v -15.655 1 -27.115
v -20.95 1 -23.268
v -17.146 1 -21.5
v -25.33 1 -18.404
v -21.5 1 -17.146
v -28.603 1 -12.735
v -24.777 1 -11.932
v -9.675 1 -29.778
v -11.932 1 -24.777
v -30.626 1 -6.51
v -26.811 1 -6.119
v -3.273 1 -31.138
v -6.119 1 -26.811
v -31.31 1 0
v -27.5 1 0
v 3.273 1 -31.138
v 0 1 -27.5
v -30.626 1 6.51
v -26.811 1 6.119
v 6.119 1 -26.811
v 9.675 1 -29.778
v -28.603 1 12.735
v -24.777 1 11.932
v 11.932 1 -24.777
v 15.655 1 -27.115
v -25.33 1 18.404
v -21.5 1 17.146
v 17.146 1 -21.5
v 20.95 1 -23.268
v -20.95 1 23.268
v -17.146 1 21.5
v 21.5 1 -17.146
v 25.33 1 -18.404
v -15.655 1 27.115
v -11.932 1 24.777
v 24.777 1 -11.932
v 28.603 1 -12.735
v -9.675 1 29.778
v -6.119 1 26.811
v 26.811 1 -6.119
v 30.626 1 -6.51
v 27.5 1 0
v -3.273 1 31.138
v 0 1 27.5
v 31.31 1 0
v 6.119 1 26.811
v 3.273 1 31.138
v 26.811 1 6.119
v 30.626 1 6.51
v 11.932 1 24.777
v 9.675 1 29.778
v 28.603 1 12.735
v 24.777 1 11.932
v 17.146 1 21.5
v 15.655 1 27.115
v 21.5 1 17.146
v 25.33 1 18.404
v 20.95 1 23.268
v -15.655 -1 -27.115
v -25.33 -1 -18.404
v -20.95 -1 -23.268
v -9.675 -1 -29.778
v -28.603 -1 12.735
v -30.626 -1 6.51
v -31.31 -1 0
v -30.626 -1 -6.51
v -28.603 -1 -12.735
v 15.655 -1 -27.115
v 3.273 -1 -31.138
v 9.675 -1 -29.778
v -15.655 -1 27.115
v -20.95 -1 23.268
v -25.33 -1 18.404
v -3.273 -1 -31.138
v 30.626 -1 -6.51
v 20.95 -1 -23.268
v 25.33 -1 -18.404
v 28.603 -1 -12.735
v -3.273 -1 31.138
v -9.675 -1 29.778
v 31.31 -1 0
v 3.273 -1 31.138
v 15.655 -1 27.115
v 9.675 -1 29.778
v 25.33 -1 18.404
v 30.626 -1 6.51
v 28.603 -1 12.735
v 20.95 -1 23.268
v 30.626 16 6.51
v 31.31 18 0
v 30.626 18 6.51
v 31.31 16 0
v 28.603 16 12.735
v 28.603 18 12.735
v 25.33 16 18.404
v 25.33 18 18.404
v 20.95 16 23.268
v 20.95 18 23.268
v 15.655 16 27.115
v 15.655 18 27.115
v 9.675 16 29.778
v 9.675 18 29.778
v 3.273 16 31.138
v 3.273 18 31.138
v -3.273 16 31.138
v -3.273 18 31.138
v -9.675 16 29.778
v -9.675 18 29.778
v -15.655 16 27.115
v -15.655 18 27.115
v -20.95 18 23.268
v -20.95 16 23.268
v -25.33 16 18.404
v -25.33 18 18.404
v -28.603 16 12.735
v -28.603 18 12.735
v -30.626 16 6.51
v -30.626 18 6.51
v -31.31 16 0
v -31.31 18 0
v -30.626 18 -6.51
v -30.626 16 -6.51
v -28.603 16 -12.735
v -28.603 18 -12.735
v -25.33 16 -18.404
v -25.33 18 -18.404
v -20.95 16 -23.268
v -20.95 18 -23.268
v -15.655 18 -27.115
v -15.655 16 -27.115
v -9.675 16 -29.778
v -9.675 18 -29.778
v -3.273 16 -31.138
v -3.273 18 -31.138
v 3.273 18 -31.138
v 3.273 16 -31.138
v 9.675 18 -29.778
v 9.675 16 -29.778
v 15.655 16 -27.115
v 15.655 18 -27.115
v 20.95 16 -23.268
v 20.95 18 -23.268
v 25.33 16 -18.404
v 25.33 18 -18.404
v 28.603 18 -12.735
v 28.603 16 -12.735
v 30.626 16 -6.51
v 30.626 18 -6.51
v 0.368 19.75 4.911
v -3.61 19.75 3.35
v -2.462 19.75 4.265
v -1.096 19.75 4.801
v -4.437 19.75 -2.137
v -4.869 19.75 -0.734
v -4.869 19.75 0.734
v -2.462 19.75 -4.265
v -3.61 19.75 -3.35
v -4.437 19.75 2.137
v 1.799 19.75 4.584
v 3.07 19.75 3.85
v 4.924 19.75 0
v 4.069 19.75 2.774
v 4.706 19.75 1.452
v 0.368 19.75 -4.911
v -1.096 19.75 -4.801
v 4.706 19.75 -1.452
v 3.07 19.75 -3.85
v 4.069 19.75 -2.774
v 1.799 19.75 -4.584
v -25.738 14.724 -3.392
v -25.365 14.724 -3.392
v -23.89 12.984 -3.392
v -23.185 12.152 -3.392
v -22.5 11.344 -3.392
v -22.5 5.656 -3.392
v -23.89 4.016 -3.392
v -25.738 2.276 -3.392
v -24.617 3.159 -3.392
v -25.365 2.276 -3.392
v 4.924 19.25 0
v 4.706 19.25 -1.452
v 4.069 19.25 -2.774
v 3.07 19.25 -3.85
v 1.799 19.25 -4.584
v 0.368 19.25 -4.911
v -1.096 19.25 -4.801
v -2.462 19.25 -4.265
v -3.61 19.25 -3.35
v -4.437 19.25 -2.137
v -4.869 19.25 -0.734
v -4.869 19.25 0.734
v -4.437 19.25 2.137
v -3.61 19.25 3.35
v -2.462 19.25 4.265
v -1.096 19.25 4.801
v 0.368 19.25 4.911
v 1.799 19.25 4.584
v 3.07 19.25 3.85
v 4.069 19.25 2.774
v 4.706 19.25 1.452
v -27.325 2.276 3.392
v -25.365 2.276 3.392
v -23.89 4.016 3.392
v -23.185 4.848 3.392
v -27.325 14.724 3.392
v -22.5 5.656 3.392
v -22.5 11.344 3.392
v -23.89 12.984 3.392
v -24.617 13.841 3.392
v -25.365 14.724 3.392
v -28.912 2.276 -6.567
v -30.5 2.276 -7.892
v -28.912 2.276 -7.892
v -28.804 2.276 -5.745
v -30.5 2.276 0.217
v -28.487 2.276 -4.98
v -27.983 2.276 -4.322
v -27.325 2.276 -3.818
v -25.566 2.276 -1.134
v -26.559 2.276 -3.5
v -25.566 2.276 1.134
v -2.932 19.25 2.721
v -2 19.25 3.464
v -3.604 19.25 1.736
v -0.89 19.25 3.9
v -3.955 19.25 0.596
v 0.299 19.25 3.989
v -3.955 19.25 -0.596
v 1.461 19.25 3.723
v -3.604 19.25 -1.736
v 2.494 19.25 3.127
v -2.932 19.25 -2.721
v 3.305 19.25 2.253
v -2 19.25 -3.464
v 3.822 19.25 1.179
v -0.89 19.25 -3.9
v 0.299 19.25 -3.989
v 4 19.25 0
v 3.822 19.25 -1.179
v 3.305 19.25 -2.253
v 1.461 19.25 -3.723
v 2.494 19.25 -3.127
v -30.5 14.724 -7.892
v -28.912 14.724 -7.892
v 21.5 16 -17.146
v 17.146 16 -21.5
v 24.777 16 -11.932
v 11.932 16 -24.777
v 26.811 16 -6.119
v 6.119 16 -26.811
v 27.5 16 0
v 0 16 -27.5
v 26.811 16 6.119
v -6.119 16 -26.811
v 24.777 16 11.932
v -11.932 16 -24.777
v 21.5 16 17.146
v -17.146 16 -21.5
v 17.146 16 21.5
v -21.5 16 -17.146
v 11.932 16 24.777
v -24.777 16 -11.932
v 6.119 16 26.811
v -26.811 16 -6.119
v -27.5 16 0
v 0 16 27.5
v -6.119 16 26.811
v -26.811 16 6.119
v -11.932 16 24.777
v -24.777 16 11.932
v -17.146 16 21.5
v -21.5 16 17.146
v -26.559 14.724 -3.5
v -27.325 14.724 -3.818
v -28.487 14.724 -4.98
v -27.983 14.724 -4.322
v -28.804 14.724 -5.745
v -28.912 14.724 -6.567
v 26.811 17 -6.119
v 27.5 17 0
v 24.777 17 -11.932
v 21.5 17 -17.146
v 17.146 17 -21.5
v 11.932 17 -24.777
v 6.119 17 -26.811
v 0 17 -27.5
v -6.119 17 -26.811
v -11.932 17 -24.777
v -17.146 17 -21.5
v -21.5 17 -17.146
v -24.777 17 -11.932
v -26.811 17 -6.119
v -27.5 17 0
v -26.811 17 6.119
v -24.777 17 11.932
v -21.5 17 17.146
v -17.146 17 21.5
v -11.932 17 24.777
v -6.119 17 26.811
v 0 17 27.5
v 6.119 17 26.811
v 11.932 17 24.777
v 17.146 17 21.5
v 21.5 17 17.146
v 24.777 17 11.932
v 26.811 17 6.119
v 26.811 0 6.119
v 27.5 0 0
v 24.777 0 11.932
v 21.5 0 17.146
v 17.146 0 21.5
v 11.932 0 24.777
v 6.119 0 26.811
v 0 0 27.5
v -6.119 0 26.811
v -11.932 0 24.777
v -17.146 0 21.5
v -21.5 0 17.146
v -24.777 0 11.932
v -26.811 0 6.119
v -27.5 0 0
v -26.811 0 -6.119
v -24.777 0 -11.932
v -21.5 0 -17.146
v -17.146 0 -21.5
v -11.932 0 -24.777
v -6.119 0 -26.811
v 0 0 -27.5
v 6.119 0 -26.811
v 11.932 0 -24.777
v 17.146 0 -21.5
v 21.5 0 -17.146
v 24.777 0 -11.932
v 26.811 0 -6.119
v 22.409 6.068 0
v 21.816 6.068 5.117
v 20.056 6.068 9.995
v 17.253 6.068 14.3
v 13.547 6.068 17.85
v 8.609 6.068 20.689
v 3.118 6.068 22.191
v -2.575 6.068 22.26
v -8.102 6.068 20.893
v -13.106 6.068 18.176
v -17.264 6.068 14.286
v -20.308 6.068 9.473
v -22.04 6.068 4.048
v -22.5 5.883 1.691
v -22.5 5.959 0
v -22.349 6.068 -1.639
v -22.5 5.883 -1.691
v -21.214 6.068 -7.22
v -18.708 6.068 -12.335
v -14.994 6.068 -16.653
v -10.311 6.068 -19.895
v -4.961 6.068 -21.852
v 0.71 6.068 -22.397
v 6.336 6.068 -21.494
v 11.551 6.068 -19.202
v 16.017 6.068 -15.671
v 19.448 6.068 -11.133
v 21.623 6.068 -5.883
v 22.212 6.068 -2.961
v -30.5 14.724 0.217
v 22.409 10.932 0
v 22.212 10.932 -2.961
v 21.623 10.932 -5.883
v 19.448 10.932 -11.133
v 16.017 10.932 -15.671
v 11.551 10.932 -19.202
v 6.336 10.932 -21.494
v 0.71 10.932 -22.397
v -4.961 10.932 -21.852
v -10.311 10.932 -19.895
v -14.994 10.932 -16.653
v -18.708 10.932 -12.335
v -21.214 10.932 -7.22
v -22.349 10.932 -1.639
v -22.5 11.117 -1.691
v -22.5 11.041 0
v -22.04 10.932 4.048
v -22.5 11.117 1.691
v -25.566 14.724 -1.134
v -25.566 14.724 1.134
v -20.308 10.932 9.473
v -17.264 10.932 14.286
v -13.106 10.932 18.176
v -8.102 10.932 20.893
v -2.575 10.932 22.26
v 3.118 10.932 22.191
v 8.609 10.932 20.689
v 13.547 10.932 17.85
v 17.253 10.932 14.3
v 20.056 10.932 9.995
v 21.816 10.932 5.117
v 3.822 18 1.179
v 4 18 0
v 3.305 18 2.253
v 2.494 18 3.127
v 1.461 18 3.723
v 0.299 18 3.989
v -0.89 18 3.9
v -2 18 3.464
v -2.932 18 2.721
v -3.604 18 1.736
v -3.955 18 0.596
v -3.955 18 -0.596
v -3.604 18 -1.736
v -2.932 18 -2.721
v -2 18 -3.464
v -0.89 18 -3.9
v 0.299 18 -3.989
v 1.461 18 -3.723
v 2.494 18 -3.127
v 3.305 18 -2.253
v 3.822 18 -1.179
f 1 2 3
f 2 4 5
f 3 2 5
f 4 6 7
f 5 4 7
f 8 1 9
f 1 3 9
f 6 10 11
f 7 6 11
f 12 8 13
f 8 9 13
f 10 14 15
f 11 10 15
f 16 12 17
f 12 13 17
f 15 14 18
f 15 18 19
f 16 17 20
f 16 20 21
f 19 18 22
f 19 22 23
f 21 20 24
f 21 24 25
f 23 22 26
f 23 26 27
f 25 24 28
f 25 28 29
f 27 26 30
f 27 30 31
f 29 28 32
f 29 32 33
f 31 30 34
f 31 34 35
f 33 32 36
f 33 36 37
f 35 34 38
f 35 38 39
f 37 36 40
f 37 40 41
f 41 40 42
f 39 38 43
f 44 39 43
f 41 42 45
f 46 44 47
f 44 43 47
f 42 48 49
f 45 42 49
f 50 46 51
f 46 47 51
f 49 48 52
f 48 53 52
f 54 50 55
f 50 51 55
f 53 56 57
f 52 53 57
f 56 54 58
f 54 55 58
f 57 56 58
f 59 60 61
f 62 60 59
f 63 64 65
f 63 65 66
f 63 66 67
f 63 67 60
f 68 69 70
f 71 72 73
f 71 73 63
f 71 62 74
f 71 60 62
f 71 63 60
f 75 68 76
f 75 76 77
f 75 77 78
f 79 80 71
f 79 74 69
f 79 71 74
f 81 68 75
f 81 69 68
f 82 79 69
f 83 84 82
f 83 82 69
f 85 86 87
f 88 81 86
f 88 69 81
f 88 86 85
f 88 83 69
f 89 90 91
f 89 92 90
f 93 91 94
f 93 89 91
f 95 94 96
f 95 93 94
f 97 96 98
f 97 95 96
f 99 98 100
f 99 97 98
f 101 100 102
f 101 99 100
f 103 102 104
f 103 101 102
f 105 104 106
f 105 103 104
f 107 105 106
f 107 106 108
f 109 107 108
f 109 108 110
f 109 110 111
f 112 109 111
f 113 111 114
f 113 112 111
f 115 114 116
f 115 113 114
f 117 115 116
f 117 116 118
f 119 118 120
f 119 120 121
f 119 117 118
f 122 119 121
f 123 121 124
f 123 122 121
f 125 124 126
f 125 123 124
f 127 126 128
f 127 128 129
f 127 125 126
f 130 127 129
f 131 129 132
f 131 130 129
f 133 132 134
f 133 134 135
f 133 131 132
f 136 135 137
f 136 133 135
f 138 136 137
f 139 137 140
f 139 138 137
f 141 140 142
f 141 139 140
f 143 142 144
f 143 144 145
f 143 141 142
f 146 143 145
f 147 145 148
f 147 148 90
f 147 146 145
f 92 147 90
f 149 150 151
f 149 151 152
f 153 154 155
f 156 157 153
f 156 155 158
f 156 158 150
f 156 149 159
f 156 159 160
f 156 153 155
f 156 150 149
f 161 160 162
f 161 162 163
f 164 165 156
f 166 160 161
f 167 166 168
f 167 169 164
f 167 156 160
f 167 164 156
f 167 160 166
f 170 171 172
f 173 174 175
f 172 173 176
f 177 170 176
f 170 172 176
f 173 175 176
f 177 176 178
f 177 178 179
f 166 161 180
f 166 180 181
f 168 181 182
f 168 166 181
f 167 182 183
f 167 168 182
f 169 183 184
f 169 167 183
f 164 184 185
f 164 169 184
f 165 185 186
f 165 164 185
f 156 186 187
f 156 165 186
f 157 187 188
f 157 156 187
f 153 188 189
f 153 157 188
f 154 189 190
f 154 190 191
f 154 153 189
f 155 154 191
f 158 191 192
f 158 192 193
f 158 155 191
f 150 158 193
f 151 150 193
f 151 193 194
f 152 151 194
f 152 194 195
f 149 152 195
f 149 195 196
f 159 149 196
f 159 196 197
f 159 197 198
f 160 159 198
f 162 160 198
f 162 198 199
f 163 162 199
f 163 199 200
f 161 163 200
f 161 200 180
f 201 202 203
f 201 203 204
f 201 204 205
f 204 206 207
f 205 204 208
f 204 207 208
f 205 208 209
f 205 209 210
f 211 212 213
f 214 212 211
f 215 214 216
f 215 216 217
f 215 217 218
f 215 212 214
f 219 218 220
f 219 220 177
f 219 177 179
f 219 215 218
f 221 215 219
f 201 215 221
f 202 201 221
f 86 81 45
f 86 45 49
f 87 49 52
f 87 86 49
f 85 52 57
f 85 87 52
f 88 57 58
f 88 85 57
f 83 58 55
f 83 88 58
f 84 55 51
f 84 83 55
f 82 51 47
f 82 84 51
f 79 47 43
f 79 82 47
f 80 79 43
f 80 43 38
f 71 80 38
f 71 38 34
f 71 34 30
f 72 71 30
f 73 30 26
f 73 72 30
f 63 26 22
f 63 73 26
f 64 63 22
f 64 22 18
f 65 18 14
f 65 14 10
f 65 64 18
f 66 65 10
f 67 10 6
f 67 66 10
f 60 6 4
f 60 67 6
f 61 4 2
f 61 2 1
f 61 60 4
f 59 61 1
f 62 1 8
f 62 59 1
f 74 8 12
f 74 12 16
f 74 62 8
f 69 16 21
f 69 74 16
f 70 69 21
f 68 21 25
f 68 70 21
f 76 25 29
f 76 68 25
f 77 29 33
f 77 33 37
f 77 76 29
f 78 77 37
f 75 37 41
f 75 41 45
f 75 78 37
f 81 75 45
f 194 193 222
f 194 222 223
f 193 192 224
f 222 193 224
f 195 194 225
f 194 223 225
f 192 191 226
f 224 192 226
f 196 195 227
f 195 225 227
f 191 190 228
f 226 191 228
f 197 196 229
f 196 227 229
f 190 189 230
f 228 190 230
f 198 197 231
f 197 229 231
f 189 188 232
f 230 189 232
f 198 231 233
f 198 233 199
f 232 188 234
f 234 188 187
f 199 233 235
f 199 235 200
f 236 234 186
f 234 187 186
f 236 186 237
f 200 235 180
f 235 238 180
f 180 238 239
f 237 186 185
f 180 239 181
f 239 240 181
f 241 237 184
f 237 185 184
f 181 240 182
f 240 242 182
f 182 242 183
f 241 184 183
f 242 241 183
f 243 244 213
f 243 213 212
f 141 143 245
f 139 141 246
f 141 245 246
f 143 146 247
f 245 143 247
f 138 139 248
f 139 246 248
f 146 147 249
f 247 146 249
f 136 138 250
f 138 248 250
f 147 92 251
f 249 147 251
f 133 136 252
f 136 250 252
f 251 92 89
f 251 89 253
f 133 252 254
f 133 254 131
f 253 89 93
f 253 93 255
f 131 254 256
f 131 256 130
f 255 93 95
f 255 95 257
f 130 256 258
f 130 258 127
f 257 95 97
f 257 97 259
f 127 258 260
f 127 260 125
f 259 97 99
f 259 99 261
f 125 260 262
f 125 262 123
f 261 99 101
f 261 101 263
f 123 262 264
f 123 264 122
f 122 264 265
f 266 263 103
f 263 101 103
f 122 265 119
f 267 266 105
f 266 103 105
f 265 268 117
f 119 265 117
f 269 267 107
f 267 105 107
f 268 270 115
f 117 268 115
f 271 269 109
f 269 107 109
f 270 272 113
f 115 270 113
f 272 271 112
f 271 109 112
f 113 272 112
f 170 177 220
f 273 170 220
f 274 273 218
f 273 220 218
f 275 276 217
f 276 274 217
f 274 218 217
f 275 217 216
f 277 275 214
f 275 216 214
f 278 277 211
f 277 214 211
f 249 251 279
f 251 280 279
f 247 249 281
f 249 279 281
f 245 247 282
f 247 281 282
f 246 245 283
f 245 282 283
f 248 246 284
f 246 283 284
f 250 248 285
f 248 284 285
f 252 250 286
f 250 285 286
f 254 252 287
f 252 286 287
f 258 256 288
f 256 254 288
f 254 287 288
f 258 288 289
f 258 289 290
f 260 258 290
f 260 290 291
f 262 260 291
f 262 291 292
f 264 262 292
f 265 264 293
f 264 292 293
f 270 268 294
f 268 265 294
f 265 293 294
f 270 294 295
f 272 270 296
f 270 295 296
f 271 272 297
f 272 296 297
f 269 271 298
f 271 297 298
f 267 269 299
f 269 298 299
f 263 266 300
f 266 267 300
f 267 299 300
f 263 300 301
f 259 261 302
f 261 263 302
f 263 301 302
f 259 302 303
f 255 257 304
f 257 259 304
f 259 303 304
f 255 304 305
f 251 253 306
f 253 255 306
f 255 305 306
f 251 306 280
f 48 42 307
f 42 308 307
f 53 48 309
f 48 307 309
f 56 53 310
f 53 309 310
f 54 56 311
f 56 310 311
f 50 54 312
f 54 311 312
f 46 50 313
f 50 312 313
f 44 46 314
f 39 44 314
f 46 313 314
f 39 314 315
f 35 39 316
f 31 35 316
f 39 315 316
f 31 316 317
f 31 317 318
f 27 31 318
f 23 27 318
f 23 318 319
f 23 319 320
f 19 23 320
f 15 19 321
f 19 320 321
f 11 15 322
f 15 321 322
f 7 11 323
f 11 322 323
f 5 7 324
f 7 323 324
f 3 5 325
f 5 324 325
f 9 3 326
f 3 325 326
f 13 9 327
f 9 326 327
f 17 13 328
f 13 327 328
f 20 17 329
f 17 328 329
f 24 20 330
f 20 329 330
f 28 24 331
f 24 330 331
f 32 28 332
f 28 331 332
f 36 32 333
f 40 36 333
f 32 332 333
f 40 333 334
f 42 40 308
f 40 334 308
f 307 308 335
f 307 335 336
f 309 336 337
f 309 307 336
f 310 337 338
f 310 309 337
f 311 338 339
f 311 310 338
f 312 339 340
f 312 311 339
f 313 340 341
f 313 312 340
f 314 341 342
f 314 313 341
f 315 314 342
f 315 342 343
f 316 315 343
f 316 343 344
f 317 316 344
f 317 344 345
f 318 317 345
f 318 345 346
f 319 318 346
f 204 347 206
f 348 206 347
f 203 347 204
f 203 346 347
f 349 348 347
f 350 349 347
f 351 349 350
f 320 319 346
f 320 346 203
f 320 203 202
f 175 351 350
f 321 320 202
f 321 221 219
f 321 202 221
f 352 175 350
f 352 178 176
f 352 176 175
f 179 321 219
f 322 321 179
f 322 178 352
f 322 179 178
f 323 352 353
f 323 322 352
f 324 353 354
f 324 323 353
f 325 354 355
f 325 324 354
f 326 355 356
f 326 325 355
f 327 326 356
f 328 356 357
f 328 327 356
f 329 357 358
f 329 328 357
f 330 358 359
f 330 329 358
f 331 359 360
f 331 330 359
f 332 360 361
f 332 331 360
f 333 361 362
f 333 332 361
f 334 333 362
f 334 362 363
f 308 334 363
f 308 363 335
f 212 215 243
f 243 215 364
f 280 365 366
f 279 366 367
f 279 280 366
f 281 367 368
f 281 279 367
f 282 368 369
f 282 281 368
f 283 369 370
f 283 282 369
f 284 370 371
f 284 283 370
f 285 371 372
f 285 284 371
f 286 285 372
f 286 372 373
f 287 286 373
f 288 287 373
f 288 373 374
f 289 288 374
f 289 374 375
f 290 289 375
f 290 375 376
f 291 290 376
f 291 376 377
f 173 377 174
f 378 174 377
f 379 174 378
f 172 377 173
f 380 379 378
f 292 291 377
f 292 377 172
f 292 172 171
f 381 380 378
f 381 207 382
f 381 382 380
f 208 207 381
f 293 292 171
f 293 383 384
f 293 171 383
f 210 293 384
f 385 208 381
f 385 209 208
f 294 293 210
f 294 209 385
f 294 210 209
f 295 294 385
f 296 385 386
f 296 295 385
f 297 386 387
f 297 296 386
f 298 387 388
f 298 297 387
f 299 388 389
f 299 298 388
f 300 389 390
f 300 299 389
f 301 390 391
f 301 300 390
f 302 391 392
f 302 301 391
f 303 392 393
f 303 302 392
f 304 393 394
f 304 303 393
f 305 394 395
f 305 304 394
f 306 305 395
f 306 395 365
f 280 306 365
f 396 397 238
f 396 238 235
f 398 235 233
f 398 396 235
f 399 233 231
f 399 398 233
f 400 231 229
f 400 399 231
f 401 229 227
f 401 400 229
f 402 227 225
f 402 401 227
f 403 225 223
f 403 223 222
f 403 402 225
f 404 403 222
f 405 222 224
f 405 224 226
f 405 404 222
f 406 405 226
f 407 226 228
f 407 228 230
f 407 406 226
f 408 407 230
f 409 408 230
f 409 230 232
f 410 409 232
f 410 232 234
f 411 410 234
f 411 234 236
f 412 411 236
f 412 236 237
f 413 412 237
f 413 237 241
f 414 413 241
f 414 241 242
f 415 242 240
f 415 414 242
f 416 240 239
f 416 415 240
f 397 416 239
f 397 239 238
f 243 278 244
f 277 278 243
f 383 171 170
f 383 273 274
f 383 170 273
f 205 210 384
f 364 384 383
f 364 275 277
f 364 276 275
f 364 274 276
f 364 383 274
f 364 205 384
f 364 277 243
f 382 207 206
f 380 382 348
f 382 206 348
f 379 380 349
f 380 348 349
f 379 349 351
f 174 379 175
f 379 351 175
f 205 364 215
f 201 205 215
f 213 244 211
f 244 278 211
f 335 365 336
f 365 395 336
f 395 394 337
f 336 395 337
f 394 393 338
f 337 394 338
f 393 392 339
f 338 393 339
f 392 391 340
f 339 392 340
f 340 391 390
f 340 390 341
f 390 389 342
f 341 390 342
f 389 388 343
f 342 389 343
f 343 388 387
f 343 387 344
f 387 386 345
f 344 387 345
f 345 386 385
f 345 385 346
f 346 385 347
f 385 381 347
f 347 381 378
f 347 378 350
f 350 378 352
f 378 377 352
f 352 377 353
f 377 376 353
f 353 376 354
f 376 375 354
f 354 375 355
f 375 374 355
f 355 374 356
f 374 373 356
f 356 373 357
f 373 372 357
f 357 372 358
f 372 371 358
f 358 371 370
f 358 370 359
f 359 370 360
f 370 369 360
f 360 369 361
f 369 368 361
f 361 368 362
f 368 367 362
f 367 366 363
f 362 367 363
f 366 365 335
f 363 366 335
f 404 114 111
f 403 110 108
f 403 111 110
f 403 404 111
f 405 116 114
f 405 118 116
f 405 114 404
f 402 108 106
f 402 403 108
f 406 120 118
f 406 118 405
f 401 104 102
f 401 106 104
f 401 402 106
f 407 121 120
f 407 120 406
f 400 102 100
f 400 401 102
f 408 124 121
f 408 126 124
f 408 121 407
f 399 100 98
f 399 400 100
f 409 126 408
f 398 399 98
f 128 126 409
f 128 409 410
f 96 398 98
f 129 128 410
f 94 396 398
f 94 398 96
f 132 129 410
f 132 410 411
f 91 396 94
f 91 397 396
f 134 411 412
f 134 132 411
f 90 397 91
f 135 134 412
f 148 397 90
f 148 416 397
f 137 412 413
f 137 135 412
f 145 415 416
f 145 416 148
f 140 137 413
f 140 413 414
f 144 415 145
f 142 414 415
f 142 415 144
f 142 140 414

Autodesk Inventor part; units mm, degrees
ref_plane "YZ Plane" through (0, 0, 0) normal (1, 0, 0) x (0, 1, 0)
ref_plane "XZ Plane" through (0, 0, 0) normal (0, 1, 0) x (-1, 0, 0)
ref_plane "XY Plane" through (0, 0, 0) normal (0, 0, 1) x (1, 0, 0)
sketch "Sketch1" plane through (0, 0, 0) normal (0, 0, 1) x (1, 0, 0)
  line L0 (0, 0) -> (27.5, 0)
  line L1 (27.5, 17) -> (0, 17)
  line L2 (0, 17) -> (0, 0)
  line L3 (0, 8.5) -> (32.996, 8.5) construction
  line L4 (27.5, 17) -> (20.3677, 8.5)
  line L5 (27.5, 17) -> (38.596, 17) construction
  line L6 (27.5, 0) -> (20.3677, 8.5)
  dimension "d0" = 27.5
  dimension "d2" = 17
  dimension "d3" = 27.5
  dimension "d4" = 130
revolve "Revolution1" add sketch "Sketch1" angle 360 about axis through (0, 17, 0) along (0, -1, 0)
sketch "Sketch4" plane through (0, 0, 0) normal (0, -1, 0) x (1, 0, 0)
  circle A0 centre (0, 0) radius 27.5 projected
  circle A1 centre (0, 0) radius 31.31
  dimension "d12" = 3.81
extrude "Extrusion2" add sketch "Sketch4" along normal blind 1 and the other way blind 1
ref_plane "Work Plane1" through (0, 8.5, 0) normal (0, -1, 0) x (1, 0, 0)
sketch "Sketch5" plane through (0, 0, 0) normal (0, -1, 0) x (1, 0, 0)
  circle A0 centre (0, 0) radius 27.5
extrude "Extrusion3" add sketch "Sketch5" along normal blind 1
mirror "Mirror1" about plane through (0, 8.5, 0) normal (0, -1, 0) of "Extrusion2"
sketch "Sketch6" plane through (0, 17, 0) normal (0, 1, 0) x (1, 0, 0)
  circle A0 centre (0, 0) radius 27.5
extrude "Extrusion4" add sketch "Sketch6" along normal blind 1
chamfer "Chamfer1" distance 3.175 angle 45 1 edges at (-20.3677, 8.5, 0)
sketch "Sketch7" plane through (0, 18, 0) normal (0, 1, 0) x (1, 0, 0)
  circle A0 centre (0, 0) radius 31.31 construction
  line L0 (0, 31.31) -> (0, -31.31) construction
  circle A1 centre (0, 0) radius 22.4085 projected
  circle A2 centre (0, 0) radius 27.5 projected
  circle A3 centre (0, 0) radius 22.4085 projected
  circle A4 centre (0, 0) radius 27.5 construction
  line L1 (-27.5, 14.9688) -> (-27.5, 0) construction
  circle A5 centre (0, 0) radius 27.5 construction
  line L2 (-27.5, -14.9688) -> (-27.5, 0) construction
ref_plane "Work Plane2" through (-27.5, 18, 14.9688) normal (-1, 0, 0) x (0, 0, -1)
sketch "Sketch8" plane through (-27.5, 18, 14.9688) normal (-1, 0, 0) x (0, 0, -1)
  line L0 (37.3773, 7.0678) -> (37.3773, 11.9322) construction
  line L1 (37.3773, 9.5) -> (-7.4397, 9.5) construction
  line L2 (-7.4397, 7.0678) -> (-7.4397, 11.9322) construction
  line L3 (18.361, 15.7245) -> (11.5766, 15.7245)
  line L4 (11.5766, 15.7245) -> (11.5766, 3.2755)
  line L5 (11.5766, 3.2755) -> (18.361, 3.2755)
  line L6 (18.361, 3.2755) -> (18.361, 15.7245)
  line L7 (18.361, 15.7245) -> (11.5766, 3.2755) construction
  line L8 (11.5766, 15.7245) -> (18.361, 3.2755) construction
  point P0 (14.9688, 18)
  point P1 (14.9688, 9.5)
extrude "Extrusion5" add sketch "Sketch8" along normal blind 3 and the other way blind 5
chamfer "Chamfer2" distance 3.175 angle 45 1 edges at (-30.5, 8.5, 3.3922)
sketch "Sketch9" plane through (-25.3648, 2.2755, -3.3922) normal (0, 0, -1) x (-1, 0, 0)
  line L0 (5.1352, 0) -> (1.9602, 0) projected
  line L1 (0, 12.449) -> (5.1352, 12.449) projected
  line L2 (3.5477, 0) -> (5.1352, 0)
  line L3 (5.1352, 0) -> (5.1352, 12.449)
  line L4 (5.1352, 12.449) -> (3.5477, 12.449)
  line L5 (3.5477, 12.449) -> (3.5477, 0)
  point P0 (-25.3648, -2.2755)
extrude "Extrusion6" add sketch "Sketch9" along normal blind 4.5
fillet "Fillet2" radius 3.175 1 edges at (-28.9125, 8.5, -3.3922)
sketch "Sketch10" plane through (0, 18, 0) normal (0, 1, 0) x (1, 0, 0)
  circle A0 centre (0, 0) radius 4
  dimension "d35" = 8
extrude "Extrusion7" add sketch "Sketch10" along normal blind 1.5
sketch "Sketch11" plane through (0, 19.5, 0) normal (0, 1, 0) x (1, 0, 0)
  circle A0 centre (0, 0) radius 4.9245
  dimension "d38" = 9.849
extrude "Extrusion8" add sketch "Sketch11" along normal mid plane 0.5
properties part number "WireRewindDRUM"
